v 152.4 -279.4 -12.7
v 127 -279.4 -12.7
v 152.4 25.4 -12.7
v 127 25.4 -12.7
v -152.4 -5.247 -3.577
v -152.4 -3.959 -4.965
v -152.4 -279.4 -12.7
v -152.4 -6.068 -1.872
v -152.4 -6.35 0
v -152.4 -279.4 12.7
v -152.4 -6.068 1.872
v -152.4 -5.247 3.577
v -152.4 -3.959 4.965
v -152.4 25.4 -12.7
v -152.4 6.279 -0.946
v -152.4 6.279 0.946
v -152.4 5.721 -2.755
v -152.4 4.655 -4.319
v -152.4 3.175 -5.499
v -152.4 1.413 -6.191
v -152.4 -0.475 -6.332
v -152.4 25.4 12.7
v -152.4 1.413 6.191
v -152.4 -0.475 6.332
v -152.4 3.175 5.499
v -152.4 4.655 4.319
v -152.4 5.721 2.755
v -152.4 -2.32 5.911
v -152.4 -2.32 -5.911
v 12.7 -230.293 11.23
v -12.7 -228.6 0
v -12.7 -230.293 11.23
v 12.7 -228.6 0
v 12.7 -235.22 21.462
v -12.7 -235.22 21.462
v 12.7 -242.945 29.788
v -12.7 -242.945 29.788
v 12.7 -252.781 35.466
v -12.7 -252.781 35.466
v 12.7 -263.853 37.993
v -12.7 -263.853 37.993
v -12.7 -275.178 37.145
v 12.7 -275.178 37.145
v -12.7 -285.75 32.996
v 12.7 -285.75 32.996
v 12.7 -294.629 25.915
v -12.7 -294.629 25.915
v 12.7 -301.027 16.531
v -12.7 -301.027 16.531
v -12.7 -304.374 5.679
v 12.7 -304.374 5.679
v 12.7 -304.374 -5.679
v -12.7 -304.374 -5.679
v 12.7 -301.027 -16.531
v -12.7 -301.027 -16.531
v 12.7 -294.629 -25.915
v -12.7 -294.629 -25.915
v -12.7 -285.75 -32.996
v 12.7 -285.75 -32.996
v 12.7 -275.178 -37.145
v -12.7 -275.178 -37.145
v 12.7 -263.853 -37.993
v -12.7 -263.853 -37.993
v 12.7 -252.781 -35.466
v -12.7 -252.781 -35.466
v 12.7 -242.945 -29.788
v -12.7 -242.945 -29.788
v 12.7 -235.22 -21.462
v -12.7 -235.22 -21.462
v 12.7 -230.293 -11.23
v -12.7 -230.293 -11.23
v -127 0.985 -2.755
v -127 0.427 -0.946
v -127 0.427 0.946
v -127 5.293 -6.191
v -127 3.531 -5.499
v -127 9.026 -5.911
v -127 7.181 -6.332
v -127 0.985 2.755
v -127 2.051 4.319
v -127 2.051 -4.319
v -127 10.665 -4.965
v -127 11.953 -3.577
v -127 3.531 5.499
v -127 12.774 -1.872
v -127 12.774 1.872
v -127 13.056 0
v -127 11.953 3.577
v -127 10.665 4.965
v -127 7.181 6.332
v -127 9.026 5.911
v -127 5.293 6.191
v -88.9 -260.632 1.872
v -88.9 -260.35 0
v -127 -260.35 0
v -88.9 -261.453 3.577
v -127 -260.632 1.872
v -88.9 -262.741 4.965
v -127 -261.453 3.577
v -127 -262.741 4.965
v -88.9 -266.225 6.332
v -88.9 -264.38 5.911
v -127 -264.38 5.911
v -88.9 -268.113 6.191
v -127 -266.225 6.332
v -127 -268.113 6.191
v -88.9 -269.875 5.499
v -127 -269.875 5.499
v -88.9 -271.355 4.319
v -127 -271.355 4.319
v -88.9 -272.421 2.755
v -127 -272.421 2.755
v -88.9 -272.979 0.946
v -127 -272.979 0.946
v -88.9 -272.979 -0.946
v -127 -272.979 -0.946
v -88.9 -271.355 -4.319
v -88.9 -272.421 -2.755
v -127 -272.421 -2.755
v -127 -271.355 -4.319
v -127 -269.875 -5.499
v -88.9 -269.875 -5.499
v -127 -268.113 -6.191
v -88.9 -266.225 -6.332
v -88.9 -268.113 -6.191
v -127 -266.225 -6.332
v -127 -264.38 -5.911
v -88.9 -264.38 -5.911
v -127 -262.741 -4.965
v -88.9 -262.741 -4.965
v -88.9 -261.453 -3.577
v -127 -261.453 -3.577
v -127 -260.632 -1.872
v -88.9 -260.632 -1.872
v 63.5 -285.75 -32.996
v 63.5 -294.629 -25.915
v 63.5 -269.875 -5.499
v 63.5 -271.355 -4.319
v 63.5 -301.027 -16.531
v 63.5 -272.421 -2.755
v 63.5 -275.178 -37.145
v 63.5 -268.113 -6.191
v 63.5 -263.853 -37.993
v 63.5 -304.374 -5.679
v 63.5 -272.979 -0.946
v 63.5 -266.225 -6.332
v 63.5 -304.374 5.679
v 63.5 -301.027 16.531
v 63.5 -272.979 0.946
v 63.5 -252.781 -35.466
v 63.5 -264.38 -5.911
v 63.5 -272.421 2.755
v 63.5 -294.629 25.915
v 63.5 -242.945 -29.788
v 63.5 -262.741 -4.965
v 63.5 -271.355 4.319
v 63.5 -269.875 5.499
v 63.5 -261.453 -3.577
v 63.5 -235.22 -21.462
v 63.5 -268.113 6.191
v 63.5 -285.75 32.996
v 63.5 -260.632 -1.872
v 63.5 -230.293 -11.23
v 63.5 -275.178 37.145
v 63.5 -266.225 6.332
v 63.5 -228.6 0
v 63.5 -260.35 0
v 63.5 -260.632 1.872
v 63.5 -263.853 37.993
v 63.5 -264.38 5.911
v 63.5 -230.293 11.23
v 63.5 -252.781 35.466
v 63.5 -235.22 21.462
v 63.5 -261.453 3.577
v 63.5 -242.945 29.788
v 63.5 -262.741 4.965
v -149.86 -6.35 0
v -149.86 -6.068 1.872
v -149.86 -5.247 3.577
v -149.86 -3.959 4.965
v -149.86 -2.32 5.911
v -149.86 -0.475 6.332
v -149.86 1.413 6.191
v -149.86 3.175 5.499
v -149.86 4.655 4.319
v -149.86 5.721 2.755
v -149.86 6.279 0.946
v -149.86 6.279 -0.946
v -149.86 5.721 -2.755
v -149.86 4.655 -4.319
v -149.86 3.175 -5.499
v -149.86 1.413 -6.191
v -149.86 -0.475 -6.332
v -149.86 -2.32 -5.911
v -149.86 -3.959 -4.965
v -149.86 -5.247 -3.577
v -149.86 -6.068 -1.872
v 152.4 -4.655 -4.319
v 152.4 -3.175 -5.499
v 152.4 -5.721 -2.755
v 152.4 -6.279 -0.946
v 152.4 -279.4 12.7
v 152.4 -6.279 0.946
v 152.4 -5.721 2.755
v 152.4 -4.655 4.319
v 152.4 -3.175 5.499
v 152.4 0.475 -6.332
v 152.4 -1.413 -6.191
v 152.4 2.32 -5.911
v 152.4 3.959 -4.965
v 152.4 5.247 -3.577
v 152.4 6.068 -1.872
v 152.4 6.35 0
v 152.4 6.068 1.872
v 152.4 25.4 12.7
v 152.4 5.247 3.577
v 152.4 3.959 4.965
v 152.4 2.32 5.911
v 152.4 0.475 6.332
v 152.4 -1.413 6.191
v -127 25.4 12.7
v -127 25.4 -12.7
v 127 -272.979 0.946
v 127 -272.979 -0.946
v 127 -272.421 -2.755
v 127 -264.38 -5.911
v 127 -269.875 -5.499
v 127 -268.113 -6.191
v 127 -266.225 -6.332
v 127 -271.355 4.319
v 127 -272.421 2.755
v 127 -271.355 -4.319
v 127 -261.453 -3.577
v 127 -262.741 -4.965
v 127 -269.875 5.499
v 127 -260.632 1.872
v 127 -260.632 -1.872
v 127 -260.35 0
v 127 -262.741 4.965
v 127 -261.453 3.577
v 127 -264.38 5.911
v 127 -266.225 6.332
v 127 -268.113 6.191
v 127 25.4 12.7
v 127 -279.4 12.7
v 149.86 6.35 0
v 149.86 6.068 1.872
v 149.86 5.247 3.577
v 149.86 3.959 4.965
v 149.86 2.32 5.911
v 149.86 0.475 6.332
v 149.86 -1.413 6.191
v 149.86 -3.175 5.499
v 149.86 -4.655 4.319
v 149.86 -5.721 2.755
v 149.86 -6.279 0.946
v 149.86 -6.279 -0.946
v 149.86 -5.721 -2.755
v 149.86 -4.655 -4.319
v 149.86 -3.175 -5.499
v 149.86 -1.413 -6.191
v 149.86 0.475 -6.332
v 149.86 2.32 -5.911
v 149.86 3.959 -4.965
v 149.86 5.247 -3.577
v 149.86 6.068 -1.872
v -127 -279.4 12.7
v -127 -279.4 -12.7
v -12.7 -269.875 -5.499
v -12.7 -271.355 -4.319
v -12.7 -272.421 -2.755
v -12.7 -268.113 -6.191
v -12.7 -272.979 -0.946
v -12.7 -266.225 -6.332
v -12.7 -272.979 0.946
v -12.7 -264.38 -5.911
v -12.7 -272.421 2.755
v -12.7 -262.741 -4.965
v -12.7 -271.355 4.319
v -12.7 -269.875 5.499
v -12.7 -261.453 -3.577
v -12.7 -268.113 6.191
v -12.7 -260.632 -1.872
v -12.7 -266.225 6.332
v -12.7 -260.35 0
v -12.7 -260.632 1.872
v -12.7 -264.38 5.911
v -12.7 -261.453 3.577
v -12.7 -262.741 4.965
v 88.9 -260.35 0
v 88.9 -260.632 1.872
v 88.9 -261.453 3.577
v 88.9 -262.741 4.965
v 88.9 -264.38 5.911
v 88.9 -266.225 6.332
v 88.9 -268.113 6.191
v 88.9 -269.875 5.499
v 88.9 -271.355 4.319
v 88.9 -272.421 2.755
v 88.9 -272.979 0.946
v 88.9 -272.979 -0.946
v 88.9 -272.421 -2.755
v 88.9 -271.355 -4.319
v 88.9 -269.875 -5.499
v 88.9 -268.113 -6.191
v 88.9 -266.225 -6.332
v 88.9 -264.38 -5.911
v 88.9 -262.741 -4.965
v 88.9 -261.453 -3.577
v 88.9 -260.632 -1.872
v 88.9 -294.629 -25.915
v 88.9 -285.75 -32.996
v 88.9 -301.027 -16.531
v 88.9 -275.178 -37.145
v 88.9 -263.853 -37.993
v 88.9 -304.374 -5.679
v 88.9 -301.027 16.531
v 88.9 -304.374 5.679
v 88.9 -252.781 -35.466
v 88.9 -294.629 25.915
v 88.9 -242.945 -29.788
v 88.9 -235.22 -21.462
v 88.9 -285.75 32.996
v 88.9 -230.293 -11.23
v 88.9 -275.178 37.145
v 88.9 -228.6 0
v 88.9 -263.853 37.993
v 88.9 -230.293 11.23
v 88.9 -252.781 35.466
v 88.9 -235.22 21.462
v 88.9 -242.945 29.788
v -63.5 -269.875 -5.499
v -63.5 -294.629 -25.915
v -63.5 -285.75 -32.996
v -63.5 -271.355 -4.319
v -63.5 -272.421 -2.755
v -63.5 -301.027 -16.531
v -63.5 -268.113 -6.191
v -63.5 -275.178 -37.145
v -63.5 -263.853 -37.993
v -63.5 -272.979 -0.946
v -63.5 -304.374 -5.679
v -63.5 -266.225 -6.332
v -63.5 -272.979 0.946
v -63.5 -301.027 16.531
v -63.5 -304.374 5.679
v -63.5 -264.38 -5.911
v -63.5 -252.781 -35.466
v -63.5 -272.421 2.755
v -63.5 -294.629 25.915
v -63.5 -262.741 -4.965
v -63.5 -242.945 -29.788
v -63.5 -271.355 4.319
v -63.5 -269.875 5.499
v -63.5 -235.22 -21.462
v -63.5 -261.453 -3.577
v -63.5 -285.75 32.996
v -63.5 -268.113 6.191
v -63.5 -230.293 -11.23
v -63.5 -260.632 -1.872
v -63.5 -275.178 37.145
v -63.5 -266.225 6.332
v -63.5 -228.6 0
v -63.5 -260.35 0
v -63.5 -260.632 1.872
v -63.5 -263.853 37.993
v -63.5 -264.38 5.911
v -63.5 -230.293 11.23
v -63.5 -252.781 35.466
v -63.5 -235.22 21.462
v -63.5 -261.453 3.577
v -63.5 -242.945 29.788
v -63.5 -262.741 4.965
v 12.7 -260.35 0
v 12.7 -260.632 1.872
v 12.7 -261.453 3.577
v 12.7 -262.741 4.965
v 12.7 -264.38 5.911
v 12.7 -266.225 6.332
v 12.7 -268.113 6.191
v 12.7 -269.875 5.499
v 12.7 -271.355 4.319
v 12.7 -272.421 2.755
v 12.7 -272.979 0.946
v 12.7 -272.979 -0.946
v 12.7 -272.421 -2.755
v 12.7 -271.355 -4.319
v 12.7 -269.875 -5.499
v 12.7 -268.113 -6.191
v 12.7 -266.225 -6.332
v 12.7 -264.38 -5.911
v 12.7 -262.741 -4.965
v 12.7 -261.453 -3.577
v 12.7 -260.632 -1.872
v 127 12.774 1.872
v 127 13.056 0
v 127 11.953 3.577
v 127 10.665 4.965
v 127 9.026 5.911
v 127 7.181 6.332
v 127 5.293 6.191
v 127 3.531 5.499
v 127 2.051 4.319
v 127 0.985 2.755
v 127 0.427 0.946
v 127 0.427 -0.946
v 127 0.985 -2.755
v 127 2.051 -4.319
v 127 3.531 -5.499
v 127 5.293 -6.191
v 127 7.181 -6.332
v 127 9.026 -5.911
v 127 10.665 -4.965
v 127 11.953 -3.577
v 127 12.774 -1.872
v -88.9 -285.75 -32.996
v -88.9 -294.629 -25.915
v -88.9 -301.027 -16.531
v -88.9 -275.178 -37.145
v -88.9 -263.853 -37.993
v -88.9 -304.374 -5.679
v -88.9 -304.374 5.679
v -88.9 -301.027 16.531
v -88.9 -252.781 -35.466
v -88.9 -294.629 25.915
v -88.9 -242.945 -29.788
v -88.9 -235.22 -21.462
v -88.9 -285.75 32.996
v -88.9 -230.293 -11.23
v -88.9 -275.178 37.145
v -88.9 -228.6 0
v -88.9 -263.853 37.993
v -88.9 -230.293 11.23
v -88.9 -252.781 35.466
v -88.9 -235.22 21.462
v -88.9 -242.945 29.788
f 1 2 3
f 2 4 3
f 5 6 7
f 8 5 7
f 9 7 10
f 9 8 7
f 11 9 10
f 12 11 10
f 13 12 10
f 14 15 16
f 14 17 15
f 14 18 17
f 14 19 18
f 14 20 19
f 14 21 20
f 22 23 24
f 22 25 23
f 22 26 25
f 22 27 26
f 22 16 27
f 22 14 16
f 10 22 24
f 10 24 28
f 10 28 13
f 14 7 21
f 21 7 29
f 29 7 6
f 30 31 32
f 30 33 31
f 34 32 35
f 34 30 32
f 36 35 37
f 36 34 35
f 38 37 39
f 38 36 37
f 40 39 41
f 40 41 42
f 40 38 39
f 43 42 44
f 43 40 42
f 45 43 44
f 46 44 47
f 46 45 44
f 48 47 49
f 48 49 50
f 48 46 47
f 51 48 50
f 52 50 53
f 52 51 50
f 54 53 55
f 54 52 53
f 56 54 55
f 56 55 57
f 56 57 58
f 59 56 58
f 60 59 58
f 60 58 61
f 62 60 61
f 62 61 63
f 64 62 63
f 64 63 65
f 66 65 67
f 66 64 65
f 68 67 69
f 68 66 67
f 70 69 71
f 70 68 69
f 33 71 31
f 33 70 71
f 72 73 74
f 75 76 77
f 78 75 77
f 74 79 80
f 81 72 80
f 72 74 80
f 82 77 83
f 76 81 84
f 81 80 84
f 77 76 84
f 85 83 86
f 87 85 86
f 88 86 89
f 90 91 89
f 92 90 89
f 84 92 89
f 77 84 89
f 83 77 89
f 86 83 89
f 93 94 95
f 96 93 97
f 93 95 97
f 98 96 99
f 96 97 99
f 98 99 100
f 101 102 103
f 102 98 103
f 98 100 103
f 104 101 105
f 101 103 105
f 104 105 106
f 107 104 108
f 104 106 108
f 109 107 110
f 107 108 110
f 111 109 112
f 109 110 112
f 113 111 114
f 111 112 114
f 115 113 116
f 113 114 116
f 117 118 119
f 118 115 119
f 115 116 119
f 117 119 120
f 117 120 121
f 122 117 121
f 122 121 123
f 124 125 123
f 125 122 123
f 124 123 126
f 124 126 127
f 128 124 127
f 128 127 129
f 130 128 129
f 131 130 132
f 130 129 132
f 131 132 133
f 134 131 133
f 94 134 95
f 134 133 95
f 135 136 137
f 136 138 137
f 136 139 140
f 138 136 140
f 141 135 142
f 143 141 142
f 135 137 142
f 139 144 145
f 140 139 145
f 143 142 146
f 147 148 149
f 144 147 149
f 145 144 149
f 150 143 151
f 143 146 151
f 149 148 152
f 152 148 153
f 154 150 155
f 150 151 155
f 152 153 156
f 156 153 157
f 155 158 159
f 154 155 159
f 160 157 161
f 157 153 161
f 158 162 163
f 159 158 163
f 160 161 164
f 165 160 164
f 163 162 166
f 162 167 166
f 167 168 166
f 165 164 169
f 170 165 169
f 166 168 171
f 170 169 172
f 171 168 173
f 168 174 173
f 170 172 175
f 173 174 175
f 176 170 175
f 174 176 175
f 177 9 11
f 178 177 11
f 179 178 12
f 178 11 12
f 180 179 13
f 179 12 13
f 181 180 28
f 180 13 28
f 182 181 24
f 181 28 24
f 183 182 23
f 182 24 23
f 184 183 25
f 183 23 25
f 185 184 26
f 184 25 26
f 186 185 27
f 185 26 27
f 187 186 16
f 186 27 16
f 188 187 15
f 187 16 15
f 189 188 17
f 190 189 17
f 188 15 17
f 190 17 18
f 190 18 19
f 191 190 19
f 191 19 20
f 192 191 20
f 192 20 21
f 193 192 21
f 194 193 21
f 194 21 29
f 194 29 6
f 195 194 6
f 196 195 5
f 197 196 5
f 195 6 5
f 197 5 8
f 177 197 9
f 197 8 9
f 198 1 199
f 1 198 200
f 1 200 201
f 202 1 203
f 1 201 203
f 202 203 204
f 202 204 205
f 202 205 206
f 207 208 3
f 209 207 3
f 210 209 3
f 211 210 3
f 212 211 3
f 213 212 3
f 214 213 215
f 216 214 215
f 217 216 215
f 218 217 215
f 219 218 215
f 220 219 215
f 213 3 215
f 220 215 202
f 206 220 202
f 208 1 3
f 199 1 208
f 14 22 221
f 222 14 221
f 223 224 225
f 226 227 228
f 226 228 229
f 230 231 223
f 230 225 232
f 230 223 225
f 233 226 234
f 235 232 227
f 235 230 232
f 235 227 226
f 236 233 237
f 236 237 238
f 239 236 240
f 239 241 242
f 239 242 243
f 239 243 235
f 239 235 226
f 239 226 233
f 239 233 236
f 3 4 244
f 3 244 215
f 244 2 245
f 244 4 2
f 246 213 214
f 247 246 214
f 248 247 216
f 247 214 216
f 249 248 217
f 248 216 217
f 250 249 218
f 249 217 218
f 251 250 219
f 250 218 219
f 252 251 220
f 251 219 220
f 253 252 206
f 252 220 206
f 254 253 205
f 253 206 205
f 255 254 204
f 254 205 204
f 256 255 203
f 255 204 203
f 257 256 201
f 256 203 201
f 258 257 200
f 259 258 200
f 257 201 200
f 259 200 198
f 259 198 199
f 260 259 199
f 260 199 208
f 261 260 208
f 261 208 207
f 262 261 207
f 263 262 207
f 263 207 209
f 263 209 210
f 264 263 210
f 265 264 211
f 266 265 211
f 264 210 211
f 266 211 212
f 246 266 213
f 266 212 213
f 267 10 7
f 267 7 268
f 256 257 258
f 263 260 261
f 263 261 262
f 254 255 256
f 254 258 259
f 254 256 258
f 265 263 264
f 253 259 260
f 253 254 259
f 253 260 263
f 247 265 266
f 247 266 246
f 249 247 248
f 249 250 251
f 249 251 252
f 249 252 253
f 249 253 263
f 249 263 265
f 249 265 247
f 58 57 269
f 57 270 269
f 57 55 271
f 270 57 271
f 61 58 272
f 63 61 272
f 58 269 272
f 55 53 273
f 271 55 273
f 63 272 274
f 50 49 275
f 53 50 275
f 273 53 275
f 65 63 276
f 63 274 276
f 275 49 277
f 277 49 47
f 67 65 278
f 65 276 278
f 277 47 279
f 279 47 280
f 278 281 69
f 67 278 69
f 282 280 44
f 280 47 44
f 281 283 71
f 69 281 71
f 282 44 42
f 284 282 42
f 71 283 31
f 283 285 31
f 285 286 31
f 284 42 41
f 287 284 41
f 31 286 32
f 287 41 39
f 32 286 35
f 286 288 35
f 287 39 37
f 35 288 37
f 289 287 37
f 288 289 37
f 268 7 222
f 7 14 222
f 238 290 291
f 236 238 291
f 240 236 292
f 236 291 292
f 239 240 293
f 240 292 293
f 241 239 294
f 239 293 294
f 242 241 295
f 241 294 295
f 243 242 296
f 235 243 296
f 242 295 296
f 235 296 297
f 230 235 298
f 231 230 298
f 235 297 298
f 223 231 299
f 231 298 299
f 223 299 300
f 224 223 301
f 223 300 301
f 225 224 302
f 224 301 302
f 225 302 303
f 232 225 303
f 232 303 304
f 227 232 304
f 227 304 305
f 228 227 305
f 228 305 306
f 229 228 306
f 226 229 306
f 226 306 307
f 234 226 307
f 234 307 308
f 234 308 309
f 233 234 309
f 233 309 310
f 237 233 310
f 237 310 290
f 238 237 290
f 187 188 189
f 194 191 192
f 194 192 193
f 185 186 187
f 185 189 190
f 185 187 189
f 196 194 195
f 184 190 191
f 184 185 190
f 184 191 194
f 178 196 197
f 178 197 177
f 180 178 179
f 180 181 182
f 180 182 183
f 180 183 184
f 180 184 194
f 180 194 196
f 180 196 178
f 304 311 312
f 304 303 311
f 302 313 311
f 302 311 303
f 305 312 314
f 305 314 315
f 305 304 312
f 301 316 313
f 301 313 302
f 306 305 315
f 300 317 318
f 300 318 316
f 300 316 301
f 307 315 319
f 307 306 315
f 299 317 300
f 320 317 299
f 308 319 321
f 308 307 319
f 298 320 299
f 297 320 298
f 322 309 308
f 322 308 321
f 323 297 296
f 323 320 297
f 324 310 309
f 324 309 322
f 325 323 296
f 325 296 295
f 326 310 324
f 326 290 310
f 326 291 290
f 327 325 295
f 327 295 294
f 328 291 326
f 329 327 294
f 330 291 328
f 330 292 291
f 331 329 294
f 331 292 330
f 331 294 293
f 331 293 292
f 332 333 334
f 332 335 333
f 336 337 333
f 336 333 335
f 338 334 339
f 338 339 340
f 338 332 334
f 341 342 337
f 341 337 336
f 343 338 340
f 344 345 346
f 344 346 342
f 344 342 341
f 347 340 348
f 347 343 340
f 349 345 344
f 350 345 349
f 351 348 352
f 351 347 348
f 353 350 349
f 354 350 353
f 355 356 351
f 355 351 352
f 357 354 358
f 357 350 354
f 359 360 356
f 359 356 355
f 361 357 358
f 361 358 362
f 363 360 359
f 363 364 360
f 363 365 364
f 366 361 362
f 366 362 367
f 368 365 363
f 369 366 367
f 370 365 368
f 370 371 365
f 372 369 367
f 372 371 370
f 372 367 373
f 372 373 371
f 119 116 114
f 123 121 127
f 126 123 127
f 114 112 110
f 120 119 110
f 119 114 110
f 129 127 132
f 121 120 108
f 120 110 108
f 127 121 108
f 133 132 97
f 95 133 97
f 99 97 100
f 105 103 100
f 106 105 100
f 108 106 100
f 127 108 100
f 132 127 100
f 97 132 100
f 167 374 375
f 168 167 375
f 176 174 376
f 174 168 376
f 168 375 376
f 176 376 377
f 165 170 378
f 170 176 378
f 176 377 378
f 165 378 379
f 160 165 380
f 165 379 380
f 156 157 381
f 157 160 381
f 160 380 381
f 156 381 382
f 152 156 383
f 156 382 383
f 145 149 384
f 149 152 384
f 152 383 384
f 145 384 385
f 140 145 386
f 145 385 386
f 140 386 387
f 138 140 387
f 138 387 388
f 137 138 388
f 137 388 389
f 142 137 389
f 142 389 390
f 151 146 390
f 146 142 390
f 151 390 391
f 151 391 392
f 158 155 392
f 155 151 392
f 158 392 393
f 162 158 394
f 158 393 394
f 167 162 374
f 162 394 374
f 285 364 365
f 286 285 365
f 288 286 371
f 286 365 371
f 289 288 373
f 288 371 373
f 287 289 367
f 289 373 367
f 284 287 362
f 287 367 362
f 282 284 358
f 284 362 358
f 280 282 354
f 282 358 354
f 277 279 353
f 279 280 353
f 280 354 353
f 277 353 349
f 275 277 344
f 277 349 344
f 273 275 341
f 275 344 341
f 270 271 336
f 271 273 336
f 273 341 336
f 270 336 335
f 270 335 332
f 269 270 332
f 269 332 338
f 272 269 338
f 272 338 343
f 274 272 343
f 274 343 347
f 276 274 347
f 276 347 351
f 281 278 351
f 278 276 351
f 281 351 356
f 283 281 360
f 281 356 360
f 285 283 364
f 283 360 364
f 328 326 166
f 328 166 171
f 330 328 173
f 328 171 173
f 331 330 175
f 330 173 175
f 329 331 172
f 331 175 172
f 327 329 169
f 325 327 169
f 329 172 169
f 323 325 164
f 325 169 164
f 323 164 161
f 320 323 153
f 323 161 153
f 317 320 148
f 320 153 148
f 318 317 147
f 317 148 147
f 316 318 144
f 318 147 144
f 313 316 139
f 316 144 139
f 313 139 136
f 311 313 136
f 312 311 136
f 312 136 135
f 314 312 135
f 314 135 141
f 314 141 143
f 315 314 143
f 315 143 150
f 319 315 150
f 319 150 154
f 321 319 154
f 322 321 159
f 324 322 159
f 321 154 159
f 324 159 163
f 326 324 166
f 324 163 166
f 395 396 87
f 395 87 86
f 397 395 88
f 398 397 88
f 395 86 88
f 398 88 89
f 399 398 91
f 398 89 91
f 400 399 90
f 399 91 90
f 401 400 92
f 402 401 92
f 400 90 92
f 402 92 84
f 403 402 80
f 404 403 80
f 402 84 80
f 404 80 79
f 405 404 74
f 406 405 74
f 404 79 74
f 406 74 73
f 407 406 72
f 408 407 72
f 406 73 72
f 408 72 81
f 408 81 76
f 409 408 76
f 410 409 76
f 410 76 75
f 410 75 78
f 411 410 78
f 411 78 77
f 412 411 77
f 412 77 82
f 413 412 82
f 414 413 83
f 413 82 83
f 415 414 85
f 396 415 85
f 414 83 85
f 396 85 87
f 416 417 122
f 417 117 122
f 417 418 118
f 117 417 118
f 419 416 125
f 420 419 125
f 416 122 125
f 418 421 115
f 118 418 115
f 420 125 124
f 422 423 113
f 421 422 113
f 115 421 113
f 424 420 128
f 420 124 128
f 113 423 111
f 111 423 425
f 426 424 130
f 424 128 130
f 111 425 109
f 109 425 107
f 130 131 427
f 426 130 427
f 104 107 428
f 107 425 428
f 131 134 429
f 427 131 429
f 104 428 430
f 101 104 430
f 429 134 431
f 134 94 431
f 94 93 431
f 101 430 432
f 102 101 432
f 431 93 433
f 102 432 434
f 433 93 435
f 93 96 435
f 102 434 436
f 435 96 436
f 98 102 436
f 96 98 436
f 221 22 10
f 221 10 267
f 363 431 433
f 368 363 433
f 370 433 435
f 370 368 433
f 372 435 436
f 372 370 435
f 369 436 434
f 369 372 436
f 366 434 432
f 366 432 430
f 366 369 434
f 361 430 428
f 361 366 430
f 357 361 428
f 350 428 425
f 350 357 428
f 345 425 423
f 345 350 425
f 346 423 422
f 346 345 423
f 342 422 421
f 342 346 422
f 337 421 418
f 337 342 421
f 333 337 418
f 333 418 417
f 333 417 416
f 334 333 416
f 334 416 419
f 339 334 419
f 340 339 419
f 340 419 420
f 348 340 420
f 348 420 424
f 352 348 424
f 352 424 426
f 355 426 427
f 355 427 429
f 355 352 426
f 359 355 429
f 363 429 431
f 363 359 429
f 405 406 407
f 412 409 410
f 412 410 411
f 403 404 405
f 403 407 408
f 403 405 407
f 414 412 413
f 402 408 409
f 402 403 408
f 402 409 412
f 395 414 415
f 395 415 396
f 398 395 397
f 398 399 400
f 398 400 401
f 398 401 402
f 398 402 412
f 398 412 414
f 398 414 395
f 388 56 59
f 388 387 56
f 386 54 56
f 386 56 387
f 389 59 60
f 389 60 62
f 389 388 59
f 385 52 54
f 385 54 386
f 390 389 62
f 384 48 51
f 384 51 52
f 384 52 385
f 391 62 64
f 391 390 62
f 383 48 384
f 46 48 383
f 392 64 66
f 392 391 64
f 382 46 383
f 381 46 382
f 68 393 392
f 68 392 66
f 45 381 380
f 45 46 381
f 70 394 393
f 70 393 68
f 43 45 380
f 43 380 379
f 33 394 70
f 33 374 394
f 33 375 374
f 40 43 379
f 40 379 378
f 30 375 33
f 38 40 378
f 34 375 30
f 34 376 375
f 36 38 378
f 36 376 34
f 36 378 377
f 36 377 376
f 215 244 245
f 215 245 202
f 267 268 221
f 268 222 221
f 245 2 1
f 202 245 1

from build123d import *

# Parameters (mm, degrees)
F0_W           = 25.4
F0_H           = 25.4
F1_DEPTH       = 25.4
F1_DEPTH_BACK  = 279.4
F2_R           = 6.35
F4_DEPTH       = 2.54
F3_R           = 6.35
F5_DEPTH       = 2.54
F6_R           = 6.35
F7_DEPTH       = 254
F8_R           = 6.35
F9_DEPTH       = 254
F11_START      = 63.5
F10_R          = 38.1
F11_DEPTH      = 25.4
F13_START      = -63.5
F12_R          = 38.1
F13_DEPTH      = 25.4
F14_R          = 38.1
F15_DEPTH      = 12.7
F15_DEPTH_BACK = 12.7


with BuildPart() as f1:
    # F0 (on Front) → F1 (new body, two sides)
    with BuildSketch(Plane.XZ) as f1_sk:
        with Locations((-139.7, 0)):
            Rectangle(F0_W, F0_H)
    extrude(amount=-F1_DEPTH)
    extrude(f1_sk.sketch, amount=F1_DEPTH_BACK)

    # F2 (on face) → F4 (cut)
    with BuildSketch(Plane(origin=(-152.4, 0, 0), x_dir=(0, -1, 0), z_dir=(-1, 0, 0))):
        Circle(F2_R)
    extrude(amount=-F4_DEPTH, mode=Mode.SUBTRACT)


with BuildPart() as f1b:
    # F0 (on Front) → F1, piece 2 (new body, two sides)
    with BuildSketch(Plane.XZ) as f1_2_sk:
        with Locations((139.7, 0)):
            Rectangle(F0_W, F0_H)
    extrude(amount=-F1_DEPTH)
    extrude(f1_2_sk.sketch, amount=F1_DEPTH_BACK)

    # F3 (on face) → F5 (cut)
    with BuildSketch(Plane.YZ.offset(152.4)):
        Circle(F3_R)
    extrude(amount=-F5_DEPTH, mode=Mode.SUBTRACT)


with BuildPart() as f7:
    # F6 (on face) → F7 (new body)
    with BuildSketch(Plane.YZ.offset(-127)):
        with Locations((6.7060901317, 0)):
            Circle(F6_R)
    extrude(amount=F7_DEPTH)


with BuildPart() as f9:
    # F8 (on face) → F9 (new body)
    with BuildSketch(Plane.YZ.offset(-127)):
        with Locations((-266.7, 0)):
            Circle(F8_R)
    extrude(amount=F9_DEPTH)

    # F10 (on Right) → F11 (join)
    with BuildSketch(Plane.YZ.offset(F11_START)):
        with Locations((-266.7, 0)):
            Circle(F10_R)
    extrude(amount=F11_DEPTH)

    # F12 (on Right) → F13 (join)
    with BuildSketch(Plane.YZ.offset(F13_START)):
        with Locations((-266.7, 0)):
            Circle(F12_R)
    extrude(amount=-F13_DEPTH)

    # F14 (on Right) → F15 (join, two sides)
    with BuildSketch(Plane.YZ) as f15_sk:
        with Locations((-266.7, 0)):
            Circle(F14_R)
    extrude(amount=F15_DEPTH)
    extrude(f15_sk.sketch, amount=-F15_DEPTH_BACK)


solid = Compound([f1.part, f1b.part, f7.part, f9.part])
